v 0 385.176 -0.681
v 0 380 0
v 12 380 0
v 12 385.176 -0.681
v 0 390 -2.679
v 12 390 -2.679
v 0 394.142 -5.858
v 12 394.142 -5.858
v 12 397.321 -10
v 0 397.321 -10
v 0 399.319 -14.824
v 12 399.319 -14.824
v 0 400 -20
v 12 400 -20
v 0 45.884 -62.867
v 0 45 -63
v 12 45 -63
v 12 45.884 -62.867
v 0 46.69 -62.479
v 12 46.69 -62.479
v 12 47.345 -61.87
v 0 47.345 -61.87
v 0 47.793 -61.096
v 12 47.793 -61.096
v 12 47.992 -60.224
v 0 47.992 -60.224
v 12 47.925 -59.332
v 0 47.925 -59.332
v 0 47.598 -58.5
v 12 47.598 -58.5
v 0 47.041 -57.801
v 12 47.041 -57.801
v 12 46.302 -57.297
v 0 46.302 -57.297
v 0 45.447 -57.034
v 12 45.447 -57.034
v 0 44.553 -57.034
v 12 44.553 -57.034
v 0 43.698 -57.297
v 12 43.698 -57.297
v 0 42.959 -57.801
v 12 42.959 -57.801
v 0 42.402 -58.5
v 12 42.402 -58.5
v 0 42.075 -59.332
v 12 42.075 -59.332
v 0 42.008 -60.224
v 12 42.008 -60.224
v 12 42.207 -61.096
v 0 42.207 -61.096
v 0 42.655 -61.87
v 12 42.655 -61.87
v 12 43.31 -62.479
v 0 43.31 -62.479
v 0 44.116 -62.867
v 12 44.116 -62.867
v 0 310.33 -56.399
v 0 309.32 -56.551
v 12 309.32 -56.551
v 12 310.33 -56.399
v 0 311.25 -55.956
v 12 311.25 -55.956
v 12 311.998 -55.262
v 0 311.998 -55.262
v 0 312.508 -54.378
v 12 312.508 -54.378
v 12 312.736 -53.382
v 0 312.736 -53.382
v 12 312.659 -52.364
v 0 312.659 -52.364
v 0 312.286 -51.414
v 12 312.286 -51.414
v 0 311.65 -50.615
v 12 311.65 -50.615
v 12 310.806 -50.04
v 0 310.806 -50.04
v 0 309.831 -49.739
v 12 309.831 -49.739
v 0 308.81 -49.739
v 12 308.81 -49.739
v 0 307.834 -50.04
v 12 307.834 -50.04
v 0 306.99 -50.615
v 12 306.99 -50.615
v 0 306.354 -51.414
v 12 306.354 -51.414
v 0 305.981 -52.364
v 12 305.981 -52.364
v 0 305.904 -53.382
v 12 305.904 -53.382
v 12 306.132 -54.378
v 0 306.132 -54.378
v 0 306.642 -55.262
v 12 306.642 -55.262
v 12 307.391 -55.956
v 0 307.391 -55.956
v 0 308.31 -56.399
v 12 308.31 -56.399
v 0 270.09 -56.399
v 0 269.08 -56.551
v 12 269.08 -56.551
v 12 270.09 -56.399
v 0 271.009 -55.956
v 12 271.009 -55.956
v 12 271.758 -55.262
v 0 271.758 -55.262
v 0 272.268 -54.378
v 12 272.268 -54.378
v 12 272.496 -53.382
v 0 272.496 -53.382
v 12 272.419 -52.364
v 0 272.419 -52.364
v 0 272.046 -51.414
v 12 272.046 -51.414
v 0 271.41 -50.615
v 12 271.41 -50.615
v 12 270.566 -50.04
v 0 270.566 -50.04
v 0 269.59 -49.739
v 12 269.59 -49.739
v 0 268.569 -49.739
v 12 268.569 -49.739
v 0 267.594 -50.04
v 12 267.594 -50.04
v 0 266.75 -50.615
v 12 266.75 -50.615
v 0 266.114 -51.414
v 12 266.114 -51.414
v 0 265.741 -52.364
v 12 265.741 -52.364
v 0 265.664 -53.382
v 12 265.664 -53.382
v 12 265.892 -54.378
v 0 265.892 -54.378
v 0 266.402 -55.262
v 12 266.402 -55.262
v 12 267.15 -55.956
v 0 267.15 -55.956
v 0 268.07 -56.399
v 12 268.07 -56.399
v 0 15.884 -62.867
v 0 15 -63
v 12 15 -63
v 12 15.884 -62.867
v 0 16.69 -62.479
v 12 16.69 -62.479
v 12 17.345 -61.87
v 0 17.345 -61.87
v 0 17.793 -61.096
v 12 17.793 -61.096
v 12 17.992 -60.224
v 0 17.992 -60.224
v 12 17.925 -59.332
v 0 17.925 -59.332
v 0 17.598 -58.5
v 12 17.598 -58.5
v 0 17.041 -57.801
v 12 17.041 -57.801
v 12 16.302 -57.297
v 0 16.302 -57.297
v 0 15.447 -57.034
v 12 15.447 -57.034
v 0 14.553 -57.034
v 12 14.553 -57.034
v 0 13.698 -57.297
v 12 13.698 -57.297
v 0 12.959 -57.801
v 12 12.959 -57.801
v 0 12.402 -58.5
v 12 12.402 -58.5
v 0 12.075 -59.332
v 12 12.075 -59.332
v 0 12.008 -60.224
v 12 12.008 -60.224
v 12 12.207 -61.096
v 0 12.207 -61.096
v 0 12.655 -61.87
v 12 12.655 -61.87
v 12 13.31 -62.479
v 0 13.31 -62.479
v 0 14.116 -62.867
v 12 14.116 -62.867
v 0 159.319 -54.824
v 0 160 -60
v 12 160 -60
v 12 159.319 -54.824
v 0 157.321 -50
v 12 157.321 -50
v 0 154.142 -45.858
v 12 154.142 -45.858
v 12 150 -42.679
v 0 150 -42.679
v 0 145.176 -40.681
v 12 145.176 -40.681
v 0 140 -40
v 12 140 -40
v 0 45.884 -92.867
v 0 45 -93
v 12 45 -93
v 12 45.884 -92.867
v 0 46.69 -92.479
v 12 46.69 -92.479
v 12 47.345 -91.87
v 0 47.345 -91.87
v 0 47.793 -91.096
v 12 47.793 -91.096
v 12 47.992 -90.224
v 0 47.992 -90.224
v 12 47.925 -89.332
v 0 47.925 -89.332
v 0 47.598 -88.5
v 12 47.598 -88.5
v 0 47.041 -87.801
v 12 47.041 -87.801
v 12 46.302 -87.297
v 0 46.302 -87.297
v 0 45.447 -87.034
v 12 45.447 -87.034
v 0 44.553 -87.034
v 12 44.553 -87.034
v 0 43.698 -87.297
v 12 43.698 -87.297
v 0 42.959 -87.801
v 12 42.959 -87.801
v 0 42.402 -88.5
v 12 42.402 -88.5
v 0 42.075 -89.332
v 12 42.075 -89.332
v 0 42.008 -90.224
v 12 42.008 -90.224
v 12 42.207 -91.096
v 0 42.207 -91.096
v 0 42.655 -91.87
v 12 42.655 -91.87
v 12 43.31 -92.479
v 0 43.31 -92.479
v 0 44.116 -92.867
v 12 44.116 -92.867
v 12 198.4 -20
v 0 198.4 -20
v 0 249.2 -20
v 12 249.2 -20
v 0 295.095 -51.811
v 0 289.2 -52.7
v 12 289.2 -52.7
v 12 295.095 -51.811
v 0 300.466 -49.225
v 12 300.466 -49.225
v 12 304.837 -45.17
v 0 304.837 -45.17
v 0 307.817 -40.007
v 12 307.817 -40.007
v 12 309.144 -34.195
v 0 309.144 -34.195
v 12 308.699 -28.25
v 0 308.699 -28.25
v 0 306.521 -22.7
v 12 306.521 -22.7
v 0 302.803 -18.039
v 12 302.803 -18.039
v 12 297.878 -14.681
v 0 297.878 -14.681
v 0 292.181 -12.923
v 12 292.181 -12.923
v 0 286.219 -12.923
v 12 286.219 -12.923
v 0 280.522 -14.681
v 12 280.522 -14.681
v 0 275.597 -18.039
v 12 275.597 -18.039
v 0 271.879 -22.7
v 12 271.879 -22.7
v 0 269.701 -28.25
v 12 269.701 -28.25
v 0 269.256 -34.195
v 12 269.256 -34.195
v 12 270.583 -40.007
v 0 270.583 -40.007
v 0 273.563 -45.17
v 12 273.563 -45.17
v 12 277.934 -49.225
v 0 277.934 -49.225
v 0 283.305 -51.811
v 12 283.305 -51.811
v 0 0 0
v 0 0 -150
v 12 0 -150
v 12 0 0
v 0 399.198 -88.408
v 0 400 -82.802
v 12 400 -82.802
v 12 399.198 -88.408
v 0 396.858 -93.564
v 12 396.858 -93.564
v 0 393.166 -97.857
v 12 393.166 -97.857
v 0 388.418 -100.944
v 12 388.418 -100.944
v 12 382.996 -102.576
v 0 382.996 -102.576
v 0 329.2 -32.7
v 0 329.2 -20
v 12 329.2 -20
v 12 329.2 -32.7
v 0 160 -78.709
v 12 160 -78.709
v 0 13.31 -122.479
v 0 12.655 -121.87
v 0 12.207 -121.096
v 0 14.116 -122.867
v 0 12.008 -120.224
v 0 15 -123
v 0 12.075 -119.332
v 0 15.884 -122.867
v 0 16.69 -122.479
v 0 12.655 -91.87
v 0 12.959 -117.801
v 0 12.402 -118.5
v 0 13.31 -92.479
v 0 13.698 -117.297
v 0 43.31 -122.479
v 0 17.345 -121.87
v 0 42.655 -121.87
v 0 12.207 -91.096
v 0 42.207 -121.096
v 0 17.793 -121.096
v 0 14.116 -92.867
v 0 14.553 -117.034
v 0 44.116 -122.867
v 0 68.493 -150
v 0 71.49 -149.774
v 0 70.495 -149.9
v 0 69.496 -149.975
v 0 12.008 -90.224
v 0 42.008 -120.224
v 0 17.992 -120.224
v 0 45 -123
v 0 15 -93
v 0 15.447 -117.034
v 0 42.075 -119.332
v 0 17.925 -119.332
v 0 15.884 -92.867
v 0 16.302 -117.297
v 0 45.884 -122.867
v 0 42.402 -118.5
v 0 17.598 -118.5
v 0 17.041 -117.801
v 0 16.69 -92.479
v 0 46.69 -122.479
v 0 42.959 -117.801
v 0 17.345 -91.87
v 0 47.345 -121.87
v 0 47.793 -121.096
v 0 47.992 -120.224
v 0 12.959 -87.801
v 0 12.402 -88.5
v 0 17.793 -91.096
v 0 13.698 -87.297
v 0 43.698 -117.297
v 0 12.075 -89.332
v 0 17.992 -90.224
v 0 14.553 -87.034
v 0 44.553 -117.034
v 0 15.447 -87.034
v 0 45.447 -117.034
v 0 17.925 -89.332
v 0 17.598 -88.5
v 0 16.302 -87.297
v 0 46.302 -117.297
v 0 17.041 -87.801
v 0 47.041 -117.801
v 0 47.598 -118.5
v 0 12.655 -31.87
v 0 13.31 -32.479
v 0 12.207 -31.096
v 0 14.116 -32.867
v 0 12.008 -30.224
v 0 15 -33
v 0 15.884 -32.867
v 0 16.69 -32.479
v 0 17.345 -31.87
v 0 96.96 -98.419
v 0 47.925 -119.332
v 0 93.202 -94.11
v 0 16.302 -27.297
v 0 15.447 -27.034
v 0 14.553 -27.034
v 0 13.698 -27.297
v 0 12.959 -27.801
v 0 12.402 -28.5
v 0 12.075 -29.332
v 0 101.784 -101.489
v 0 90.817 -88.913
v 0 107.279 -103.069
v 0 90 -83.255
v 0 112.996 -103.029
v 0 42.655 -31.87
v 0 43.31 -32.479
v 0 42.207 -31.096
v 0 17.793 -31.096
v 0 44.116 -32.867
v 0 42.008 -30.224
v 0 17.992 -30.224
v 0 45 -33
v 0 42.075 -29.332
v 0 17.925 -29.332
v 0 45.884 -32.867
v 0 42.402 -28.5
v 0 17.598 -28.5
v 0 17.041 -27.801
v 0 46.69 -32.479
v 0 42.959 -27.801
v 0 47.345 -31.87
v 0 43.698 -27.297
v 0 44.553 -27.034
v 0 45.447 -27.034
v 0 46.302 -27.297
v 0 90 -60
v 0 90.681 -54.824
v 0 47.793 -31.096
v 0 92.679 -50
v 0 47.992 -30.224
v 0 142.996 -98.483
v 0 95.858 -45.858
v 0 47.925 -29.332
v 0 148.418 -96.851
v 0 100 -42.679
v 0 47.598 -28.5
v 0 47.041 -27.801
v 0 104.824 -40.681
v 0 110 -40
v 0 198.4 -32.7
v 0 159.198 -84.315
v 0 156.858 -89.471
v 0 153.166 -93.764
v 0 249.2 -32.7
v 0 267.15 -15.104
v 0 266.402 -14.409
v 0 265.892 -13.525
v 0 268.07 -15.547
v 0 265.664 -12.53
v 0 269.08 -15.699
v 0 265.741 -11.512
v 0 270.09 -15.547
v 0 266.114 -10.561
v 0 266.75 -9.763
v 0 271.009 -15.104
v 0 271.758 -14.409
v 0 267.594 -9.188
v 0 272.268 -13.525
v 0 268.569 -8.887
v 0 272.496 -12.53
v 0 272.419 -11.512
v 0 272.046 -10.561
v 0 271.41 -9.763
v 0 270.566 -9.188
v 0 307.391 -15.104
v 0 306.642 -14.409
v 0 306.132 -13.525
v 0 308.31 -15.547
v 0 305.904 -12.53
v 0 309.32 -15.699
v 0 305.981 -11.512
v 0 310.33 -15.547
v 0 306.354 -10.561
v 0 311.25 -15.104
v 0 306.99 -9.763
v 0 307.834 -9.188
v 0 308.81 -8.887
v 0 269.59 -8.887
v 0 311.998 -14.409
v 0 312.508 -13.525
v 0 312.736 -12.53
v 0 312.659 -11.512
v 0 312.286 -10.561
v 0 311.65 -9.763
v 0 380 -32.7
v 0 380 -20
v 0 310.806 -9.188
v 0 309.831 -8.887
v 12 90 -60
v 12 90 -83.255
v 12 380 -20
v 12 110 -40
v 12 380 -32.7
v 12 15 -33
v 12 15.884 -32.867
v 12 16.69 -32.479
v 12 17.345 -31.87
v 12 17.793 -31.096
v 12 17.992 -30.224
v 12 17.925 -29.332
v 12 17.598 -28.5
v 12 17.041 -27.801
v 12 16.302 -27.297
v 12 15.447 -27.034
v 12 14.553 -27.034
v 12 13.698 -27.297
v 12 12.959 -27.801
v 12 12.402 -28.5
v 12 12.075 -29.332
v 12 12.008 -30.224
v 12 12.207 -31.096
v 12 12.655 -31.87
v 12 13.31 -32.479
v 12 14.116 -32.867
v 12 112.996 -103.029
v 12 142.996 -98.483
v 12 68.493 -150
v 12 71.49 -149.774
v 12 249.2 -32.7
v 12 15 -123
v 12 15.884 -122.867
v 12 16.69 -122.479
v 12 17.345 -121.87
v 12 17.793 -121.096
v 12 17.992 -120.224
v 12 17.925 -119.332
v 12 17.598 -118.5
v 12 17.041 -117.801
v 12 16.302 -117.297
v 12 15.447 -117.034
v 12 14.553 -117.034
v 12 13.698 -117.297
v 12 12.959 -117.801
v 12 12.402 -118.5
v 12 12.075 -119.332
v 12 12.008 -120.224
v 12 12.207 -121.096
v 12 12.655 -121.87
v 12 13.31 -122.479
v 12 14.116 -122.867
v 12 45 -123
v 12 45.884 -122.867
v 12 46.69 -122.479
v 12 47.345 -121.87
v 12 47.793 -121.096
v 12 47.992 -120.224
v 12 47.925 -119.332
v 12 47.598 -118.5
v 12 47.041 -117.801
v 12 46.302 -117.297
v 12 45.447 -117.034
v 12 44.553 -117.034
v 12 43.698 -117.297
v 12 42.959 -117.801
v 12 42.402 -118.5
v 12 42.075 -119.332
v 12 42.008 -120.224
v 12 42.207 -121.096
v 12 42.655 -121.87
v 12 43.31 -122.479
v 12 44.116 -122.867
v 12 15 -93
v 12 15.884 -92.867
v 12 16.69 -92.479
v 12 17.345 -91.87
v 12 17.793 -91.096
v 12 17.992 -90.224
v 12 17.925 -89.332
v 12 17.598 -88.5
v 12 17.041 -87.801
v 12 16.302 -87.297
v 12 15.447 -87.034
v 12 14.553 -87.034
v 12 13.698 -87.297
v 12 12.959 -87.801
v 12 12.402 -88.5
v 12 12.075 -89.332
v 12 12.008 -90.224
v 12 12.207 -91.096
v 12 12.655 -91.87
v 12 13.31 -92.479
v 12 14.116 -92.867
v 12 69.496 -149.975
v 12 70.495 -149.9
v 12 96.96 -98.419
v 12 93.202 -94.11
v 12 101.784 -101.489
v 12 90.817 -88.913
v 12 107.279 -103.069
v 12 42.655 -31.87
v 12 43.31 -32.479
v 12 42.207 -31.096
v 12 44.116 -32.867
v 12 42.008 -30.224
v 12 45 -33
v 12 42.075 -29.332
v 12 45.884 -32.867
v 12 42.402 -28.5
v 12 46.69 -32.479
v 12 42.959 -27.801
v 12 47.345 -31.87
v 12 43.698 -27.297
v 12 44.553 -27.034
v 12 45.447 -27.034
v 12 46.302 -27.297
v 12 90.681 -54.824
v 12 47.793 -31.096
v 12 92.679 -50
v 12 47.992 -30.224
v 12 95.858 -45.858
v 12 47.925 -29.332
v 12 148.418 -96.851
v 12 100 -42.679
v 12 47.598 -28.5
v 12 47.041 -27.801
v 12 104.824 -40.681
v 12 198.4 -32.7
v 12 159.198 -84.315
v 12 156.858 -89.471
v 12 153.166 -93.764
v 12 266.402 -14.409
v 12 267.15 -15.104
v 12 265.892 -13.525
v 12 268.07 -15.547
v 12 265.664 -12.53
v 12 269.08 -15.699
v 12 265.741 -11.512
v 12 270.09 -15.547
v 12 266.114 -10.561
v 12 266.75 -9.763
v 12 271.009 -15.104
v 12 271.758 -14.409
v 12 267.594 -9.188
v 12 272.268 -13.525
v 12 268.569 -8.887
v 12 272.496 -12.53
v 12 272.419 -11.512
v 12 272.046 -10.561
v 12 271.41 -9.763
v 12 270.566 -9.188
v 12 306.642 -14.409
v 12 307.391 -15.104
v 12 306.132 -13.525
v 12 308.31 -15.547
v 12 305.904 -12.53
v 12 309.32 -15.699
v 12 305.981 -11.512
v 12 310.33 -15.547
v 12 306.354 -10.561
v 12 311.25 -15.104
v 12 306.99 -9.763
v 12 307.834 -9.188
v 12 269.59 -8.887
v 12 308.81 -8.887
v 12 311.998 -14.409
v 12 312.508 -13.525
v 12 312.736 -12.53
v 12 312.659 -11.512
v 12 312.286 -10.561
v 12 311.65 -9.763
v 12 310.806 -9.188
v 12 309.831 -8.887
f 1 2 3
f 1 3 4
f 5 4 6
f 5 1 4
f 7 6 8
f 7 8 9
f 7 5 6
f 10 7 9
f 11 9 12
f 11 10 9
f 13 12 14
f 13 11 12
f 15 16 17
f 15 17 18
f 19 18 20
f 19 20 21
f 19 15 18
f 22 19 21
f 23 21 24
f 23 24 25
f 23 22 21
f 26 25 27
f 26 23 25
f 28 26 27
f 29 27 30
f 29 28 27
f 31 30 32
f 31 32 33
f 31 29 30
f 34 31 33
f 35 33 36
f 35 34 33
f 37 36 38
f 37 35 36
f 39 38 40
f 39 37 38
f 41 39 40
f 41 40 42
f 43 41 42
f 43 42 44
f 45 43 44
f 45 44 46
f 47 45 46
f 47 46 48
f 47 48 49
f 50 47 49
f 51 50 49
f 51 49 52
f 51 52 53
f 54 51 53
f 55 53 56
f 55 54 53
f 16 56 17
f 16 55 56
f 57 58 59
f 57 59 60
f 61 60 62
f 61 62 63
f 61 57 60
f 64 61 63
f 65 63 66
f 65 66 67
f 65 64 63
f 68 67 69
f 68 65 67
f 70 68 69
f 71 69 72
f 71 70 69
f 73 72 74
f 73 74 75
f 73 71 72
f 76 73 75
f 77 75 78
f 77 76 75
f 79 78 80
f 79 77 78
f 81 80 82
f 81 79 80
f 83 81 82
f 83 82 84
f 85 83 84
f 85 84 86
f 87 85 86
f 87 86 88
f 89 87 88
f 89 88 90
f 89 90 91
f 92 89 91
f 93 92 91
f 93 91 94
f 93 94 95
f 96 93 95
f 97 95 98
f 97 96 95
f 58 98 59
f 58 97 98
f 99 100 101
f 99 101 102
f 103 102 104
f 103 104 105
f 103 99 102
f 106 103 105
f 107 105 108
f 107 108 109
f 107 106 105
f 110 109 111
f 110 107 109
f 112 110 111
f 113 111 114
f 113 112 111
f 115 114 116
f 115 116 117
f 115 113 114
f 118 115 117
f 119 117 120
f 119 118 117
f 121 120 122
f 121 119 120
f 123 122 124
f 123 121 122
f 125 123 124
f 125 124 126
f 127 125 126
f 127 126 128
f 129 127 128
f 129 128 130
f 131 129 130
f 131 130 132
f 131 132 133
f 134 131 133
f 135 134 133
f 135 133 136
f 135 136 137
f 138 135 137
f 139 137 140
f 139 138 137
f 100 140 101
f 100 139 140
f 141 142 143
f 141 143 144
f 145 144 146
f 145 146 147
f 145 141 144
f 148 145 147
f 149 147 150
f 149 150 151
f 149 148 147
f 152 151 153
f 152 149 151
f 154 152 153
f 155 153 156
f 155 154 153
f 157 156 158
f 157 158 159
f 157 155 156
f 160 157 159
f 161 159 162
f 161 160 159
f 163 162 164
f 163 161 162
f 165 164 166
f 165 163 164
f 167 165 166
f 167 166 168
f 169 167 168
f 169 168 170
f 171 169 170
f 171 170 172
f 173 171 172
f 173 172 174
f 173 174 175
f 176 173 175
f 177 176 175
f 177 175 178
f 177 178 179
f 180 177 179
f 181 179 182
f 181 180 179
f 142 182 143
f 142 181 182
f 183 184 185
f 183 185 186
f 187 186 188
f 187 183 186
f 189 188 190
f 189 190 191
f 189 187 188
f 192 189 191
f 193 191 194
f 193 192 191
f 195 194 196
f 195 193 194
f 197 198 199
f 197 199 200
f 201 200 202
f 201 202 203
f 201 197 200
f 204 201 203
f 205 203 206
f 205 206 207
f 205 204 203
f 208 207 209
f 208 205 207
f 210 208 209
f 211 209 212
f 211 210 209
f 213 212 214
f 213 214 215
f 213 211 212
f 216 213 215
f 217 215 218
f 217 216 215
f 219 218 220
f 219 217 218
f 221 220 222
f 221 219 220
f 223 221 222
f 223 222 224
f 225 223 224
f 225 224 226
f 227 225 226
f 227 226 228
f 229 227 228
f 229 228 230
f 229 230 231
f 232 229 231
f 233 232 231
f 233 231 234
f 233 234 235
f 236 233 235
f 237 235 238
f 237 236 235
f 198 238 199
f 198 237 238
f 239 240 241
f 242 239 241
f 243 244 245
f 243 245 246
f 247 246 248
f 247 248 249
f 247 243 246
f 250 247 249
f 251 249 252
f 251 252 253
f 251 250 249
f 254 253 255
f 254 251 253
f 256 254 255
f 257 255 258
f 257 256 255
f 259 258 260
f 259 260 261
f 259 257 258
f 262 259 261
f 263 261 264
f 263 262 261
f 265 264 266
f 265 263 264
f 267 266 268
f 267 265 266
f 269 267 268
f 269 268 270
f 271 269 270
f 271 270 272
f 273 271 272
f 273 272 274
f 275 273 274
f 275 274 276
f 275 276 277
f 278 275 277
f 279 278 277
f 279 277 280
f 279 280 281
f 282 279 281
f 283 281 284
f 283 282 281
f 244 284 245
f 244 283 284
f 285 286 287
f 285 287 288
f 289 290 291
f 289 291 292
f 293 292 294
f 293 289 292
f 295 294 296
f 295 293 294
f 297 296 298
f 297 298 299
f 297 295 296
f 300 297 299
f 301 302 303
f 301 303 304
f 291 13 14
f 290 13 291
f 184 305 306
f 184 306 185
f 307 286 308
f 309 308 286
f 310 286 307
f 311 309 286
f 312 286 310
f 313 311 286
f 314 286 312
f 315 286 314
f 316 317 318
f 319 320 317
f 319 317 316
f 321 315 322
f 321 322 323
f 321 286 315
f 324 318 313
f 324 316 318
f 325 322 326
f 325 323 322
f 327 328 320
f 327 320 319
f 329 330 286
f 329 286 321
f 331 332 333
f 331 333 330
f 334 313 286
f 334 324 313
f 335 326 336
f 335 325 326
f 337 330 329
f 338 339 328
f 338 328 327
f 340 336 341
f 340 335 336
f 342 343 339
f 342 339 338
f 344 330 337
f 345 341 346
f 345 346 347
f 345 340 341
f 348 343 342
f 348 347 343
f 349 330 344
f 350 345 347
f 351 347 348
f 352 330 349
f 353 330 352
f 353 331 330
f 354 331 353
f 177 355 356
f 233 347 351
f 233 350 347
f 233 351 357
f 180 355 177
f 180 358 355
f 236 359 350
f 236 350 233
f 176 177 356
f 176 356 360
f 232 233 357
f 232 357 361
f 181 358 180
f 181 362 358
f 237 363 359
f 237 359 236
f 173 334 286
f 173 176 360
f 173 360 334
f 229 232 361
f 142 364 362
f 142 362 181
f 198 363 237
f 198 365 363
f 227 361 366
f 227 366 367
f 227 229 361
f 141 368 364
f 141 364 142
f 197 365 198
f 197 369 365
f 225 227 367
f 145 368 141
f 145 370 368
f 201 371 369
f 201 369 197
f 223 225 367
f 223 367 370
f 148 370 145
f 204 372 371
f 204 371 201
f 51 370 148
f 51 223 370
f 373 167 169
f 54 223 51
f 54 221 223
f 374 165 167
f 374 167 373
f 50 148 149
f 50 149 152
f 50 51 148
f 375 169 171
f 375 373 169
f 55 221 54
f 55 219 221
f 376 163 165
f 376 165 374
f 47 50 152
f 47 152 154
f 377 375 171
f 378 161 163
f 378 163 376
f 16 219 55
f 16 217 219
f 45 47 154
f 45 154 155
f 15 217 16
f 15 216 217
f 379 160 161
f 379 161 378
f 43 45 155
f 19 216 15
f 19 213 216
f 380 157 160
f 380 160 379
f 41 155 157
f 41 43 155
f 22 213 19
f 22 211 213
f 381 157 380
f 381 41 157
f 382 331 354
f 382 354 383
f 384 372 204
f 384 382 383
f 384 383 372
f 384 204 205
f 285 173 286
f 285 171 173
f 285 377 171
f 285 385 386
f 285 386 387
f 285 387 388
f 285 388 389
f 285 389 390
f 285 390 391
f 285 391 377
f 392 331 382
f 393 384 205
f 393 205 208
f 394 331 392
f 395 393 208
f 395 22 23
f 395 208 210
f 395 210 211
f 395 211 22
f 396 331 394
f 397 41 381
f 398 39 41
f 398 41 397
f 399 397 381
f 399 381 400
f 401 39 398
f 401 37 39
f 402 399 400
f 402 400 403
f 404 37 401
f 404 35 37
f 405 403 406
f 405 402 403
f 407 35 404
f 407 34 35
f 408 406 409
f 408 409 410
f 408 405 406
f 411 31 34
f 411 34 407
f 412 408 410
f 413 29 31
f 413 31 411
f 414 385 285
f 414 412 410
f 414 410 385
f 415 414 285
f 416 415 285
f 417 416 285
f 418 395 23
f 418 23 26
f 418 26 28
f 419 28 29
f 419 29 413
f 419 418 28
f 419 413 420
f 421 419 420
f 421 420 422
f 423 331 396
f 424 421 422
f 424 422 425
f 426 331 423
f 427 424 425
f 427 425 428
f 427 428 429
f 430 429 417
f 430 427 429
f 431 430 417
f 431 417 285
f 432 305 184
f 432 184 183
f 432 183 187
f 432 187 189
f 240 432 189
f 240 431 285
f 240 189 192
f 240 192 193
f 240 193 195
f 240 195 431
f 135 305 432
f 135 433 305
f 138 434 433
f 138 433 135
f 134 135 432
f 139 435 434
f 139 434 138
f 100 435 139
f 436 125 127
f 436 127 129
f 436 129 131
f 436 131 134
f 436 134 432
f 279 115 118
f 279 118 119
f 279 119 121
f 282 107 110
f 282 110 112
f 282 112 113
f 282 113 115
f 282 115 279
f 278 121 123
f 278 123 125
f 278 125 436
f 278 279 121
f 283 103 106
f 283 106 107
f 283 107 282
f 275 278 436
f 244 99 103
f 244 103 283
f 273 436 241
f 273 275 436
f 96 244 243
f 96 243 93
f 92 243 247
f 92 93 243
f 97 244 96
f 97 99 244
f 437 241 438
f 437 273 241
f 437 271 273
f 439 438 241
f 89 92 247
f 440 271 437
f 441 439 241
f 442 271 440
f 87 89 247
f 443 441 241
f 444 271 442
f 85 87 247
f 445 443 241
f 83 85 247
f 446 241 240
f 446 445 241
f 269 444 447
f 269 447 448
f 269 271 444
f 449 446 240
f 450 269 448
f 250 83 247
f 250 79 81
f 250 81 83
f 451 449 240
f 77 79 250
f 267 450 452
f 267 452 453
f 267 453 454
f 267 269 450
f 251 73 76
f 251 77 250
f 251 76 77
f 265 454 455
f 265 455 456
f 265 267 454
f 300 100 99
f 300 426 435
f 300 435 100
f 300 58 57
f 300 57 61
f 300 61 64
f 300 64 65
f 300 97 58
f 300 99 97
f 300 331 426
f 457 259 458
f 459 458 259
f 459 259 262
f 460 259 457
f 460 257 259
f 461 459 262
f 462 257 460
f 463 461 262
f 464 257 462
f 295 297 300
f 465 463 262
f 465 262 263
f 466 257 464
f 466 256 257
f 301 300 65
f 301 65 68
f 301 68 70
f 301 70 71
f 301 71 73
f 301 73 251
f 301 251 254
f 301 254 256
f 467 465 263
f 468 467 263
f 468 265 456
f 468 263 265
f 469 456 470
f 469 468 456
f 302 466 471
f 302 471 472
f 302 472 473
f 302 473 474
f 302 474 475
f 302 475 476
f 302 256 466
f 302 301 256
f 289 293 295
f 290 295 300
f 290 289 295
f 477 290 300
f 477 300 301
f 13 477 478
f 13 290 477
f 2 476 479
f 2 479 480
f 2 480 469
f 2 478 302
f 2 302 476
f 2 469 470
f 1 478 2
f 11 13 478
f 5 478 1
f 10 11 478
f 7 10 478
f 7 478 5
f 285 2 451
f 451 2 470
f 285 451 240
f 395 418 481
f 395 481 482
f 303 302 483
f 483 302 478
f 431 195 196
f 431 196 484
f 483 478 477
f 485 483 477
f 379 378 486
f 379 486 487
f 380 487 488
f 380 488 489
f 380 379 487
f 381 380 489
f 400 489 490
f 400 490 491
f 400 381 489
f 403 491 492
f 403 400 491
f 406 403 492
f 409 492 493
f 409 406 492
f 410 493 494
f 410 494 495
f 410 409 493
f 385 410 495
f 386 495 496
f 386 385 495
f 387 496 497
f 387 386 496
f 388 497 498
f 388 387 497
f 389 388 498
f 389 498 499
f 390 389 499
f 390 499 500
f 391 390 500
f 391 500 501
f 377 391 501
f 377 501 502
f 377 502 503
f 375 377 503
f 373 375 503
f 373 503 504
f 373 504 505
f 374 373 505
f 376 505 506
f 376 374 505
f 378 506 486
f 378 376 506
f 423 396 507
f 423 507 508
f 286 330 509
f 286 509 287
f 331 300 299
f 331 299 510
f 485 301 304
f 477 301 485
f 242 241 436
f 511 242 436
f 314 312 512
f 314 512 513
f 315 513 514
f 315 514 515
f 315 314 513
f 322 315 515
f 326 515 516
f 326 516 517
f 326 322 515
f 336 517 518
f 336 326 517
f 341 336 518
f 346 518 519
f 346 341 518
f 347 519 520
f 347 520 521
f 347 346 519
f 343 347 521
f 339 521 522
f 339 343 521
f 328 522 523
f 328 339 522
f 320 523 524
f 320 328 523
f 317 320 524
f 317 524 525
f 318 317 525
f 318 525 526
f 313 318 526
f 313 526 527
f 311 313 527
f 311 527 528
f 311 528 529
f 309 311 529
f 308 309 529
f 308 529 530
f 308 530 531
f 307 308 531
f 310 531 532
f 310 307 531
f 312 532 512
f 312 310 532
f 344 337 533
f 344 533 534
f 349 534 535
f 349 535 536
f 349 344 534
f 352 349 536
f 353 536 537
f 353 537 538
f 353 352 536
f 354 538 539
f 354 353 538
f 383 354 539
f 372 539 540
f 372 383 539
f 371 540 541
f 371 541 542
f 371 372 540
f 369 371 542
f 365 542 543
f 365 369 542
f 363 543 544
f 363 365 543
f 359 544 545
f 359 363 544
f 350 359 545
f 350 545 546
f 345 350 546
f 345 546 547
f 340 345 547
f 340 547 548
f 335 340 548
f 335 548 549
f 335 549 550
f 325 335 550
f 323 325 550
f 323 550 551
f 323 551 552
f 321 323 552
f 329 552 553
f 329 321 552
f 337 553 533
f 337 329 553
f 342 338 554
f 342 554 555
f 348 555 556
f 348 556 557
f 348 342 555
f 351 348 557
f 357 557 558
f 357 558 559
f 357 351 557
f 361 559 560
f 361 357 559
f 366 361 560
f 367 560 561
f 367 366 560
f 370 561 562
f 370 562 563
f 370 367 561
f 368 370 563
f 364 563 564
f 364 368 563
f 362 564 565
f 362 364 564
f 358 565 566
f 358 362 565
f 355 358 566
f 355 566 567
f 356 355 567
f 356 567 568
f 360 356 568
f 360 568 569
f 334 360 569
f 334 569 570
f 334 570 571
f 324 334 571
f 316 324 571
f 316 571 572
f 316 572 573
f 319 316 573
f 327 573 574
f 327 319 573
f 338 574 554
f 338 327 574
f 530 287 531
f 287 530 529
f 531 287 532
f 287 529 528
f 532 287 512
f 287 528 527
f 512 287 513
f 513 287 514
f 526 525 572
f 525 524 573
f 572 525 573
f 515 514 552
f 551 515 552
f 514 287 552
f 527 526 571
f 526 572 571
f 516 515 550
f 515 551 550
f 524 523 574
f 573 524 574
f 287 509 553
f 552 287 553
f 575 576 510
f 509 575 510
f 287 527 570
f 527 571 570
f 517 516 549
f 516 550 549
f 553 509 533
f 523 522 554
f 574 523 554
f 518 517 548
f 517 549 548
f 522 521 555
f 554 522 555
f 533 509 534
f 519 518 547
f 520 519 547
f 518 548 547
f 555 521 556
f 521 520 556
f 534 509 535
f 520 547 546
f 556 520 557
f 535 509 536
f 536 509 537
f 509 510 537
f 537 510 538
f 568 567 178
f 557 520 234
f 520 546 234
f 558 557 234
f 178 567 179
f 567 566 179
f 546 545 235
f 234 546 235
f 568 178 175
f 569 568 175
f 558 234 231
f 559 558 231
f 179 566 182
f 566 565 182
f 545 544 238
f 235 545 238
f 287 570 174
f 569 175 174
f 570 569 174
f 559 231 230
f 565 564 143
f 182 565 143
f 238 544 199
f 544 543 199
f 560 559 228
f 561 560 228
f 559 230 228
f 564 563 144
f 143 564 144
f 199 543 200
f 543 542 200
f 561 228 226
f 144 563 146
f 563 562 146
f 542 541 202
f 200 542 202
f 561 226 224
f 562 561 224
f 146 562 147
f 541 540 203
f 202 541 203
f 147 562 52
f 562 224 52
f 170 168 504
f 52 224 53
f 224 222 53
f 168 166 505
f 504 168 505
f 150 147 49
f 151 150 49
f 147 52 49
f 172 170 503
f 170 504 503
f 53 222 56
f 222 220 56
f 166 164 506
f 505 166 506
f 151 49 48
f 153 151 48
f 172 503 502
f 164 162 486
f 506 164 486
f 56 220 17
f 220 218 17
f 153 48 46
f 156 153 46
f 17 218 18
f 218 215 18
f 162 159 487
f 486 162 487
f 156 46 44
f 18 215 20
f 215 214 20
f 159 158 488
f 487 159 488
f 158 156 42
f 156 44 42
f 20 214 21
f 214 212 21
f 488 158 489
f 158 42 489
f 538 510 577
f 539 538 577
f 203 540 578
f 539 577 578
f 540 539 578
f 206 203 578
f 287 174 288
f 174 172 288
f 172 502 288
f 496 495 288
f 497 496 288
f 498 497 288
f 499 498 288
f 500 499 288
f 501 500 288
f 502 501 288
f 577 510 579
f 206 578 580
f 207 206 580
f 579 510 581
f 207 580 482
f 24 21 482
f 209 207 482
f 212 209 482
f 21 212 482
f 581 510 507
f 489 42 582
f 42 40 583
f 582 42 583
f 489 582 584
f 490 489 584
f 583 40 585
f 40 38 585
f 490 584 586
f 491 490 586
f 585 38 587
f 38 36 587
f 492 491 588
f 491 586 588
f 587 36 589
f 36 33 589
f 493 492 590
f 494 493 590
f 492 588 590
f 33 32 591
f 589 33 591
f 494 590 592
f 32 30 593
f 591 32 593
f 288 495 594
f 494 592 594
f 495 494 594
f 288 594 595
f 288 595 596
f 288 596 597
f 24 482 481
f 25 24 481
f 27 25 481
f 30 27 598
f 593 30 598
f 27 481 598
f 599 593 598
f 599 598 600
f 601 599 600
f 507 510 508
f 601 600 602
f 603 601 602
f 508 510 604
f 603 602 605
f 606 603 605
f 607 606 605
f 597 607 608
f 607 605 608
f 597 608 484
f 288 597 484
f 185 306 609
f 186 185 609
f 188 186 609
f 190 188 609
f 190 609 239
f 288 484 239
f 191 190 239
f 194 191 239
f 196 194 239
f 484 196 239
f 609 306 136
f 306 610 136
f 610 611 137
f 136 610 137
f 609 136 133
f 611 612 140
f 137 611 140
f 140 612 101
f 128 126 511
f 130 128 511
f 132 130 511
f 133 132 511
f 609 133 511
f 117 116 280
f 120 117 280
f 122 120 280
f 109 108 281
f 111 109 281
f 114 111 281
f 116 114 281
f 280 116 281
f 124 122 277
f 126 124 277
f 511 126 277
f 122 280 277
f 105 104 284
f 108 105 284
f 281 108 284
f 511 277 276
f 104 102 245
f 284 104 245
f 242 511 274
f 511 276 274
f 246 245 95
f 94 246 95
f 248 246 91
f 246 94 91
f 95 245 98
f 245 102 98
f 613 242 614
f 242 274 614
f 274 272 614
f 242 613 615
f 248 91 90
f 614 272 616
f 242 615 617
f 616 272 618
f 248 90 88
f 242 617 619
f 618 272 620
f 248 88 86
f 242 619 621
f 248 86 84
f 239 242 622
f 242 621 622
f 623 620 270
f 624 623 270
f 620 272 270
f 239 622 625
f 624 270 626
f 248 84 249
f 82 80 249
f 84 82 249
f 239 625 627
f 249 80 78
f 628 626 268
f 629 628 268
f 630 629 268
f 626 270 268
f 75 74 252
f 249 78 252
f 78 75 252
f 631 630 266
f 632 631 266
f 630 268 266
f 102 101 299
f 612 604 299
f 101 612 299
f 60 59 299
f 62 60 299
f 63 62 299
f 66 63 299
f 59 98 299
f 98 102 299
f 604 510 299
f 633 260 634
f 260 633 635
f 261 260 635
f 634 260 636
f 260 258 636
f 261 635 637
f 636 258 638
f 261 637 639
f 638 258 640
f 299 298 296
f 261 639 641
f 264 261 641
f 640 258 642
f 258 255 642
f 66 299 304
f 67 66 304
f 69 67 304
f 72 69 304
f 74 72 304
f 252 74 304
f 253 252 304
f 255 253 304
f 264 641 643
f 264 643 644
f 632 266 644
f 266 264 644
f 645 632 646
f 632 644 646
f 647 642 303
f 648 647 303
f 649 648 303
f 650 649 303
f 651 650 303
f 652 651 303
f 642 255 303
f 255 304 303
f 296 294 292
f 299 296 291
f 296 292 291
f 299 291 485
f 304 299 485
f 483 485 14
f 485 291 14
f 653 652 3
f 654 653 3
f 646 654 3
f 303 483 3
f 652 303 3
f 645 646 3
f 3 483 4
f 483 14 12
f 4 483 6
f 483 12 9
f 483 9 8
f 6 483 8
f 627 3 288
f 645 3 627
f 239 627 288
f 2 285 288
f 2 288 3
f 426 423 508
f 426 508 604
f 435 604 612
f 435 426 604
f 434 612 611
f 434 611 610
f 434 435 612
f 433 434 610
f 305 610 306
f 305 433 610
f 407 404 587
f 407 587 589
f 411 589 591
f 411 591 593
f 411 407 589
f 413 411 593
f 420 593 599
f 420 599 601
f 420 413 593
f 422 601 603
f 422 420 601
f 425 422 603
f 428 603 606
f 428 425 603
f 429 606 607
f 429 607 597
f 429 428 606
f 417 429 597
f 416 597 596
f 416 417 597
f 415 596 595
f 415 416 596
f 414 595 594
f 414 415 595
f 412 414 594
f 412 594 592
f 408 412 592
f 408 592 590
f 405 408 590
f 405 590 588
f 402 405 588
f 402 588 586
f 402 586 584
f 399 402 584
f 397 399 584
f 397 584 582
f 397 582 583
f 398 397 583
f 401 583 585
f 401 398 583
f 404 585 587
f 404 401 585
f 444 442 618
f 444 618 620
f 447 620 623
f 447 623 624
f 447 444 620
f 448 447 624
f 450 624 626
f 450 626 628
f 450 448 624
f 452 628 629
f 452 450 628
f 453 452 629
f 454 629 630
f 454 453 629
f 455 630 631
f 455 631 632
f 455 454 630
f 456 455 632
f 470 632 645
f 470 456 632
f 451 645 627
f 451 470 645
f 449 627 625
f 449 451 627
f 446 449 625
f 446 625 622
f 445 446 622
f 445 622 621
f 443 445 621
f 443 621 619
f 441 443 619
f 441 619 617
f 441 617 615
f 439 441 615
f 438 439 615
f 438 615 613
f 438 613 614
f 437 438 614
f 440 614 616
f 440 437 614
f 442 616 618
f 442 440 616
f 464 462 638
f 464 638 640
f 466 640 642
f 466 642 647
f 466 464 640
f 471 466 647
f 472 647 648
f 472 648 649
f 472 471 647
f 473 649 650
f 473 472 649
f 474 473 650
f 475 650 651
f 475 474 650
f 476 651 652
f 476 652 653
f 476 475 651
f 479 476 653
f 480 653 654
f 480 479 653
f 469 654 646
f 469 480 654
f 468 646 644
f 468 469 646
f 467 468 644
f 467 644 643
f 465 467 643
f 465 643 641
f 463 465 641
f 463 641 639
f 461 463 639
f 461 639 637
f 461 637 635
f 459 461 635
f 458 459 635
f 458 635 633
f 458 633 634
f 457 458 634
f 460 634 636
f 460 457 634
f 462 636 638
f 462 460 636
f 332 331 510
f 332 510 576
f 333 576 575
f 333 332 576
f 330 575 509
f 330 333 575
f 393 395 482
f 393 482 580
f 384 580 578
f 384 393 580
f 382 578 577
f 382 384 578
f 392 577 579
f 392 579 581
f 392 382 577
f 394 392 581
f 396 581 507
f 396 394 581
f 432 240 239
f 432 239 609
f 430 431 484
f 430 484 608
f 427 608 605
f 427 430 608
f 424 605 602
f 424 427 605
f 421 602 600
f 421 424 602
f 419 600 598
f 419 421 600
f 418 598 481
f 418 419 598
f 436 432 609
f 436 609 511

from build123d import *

# Parameters (mm, degrees)
CROQUIS1_R              = 3
CROQUIS1_R_2            = 20
CROQUIS1_R_3            = 3.425181835
CROQUIS1_W              = 12.7
CROQUIS1_H              = 50.8
SALIENTE_EXTRUIR1_DEPTH = 12


with BuildPart() as part:
    # Croquis1 → Saliente-Extruir1 (new body)
    with BuildSketch(Plane(origin=(0, 0, 0), x_dir=(0, 0, -1), z_dir=(1, 0, 0))):
        with BuildLine():
            Line((0, 0), (0, 380))
            ThreePointArc((0, 380), (5.857864376, 394.142135624), (20, 400))
            Line((20, 400), (82.802037251, 400))
            ThreePointArc((82.802037251, 400), (95.841934647, 395.164467544), (102.576347335, 382.996107589))
            Line((102.576347335, 382.996107589), (149.774310084, 71.489553442))
            ThreePointArc((149.774310084, 71.489553442), (149.943497708, 69.995743812), (150, 68.493445854))
            Line((150, 68.493445854), (150, 0))
            Line((150, 0), (0, 0))
        make_face()
        with Locations((30, 45)):
            Circle(CROQUIS1_R, mode=Mode.SUBTRACT)
        with Locations((60, 45)):
            Circle(CROQUIS1_R, mode=Mode.SUBTRACT)
        with Locations((90, 45)):
            Circle(CROQUIS1_R, mode=Mode.SUBTRACT)
        with Locations((120, 45)):
            Circle(CROQUIS1_R, mode=Mode.SUBTRACT)
        with Locations((30, 15)):
            Circle(CROQUIS1_R, mode=Mode.SUBTRACT)
        with Locations((60, 15)):
            Circle(CROQUIS1_R, mode=Mode.SUBTRACT)
        with Locations((90, 15)):
            Circle(CROQUIS1_R, mode=Mode.SUBTRACT)
        with Locations((120, 15)):
            Circle(CROQUIS1_R, mode=Mode.SUBTRACT)
        with Locations((32.7, 289.2)):
            Circle(CROQUIS1_R_2, mode=Mode.SUBTRACT)
        with Locations((12.273774242, 309.320061608)):
            Circle(CROQUIS1_R_3, mode=Mode.SUBTRACT)
        with Locations((53.126225758, 309.320061608)):
            Circle(CROQUIS1_R_3, mode=Mode.SUBTRACT)
        with Locations((53.126225758, 269.079938392)):
            Circle(CROQUIS1_R_3, mode=Mode.SUBTRACT)
        with Locations((12.273774242, 269.079938392)):
            Circle(CROQUIS1_R_3, mode=Mode.SUBTRACT)
        with Locations((26.35, 354.6)):
            Rectangle(CROQUIS1_W, CROQUIS1_H, mode=Mode.SUBTRACT)
        with Locations((26.35, 223.8)):
            Rectangle(CROQUIS1_W, CROQUIS1_H, mode=Mode.SUBTRACT)
        with BuildLine():
            Line((60, 90), (83.2545966, 90))
            ThreePointArc((83.2545966, 90), (98.419064144, 96.960102603), (103.028906685, 112.996107589))
            Line((103.028906685, 112.996107589), (98.483452139, 142.996107589))
            ThreePointArc((98.483452139, 142.996107589), (91.749039451, 155.164467544), (78.709142055, 160))
            Line((78.709142055, 160), (60, 160))
            ThreePointArc((60, 160), (45.857864376, 154.142135624), (40, 140))
            Line((40, 140), (40, 110))
            ThreePointArc((40, 110), (45.857864376, 95.857864376), (60, 90))
        make_face(mode=Mode.SUBTRACT)
    extrude(amount=SALIENTE_EXTRUIR1_DEPTH)


solid = part.part
